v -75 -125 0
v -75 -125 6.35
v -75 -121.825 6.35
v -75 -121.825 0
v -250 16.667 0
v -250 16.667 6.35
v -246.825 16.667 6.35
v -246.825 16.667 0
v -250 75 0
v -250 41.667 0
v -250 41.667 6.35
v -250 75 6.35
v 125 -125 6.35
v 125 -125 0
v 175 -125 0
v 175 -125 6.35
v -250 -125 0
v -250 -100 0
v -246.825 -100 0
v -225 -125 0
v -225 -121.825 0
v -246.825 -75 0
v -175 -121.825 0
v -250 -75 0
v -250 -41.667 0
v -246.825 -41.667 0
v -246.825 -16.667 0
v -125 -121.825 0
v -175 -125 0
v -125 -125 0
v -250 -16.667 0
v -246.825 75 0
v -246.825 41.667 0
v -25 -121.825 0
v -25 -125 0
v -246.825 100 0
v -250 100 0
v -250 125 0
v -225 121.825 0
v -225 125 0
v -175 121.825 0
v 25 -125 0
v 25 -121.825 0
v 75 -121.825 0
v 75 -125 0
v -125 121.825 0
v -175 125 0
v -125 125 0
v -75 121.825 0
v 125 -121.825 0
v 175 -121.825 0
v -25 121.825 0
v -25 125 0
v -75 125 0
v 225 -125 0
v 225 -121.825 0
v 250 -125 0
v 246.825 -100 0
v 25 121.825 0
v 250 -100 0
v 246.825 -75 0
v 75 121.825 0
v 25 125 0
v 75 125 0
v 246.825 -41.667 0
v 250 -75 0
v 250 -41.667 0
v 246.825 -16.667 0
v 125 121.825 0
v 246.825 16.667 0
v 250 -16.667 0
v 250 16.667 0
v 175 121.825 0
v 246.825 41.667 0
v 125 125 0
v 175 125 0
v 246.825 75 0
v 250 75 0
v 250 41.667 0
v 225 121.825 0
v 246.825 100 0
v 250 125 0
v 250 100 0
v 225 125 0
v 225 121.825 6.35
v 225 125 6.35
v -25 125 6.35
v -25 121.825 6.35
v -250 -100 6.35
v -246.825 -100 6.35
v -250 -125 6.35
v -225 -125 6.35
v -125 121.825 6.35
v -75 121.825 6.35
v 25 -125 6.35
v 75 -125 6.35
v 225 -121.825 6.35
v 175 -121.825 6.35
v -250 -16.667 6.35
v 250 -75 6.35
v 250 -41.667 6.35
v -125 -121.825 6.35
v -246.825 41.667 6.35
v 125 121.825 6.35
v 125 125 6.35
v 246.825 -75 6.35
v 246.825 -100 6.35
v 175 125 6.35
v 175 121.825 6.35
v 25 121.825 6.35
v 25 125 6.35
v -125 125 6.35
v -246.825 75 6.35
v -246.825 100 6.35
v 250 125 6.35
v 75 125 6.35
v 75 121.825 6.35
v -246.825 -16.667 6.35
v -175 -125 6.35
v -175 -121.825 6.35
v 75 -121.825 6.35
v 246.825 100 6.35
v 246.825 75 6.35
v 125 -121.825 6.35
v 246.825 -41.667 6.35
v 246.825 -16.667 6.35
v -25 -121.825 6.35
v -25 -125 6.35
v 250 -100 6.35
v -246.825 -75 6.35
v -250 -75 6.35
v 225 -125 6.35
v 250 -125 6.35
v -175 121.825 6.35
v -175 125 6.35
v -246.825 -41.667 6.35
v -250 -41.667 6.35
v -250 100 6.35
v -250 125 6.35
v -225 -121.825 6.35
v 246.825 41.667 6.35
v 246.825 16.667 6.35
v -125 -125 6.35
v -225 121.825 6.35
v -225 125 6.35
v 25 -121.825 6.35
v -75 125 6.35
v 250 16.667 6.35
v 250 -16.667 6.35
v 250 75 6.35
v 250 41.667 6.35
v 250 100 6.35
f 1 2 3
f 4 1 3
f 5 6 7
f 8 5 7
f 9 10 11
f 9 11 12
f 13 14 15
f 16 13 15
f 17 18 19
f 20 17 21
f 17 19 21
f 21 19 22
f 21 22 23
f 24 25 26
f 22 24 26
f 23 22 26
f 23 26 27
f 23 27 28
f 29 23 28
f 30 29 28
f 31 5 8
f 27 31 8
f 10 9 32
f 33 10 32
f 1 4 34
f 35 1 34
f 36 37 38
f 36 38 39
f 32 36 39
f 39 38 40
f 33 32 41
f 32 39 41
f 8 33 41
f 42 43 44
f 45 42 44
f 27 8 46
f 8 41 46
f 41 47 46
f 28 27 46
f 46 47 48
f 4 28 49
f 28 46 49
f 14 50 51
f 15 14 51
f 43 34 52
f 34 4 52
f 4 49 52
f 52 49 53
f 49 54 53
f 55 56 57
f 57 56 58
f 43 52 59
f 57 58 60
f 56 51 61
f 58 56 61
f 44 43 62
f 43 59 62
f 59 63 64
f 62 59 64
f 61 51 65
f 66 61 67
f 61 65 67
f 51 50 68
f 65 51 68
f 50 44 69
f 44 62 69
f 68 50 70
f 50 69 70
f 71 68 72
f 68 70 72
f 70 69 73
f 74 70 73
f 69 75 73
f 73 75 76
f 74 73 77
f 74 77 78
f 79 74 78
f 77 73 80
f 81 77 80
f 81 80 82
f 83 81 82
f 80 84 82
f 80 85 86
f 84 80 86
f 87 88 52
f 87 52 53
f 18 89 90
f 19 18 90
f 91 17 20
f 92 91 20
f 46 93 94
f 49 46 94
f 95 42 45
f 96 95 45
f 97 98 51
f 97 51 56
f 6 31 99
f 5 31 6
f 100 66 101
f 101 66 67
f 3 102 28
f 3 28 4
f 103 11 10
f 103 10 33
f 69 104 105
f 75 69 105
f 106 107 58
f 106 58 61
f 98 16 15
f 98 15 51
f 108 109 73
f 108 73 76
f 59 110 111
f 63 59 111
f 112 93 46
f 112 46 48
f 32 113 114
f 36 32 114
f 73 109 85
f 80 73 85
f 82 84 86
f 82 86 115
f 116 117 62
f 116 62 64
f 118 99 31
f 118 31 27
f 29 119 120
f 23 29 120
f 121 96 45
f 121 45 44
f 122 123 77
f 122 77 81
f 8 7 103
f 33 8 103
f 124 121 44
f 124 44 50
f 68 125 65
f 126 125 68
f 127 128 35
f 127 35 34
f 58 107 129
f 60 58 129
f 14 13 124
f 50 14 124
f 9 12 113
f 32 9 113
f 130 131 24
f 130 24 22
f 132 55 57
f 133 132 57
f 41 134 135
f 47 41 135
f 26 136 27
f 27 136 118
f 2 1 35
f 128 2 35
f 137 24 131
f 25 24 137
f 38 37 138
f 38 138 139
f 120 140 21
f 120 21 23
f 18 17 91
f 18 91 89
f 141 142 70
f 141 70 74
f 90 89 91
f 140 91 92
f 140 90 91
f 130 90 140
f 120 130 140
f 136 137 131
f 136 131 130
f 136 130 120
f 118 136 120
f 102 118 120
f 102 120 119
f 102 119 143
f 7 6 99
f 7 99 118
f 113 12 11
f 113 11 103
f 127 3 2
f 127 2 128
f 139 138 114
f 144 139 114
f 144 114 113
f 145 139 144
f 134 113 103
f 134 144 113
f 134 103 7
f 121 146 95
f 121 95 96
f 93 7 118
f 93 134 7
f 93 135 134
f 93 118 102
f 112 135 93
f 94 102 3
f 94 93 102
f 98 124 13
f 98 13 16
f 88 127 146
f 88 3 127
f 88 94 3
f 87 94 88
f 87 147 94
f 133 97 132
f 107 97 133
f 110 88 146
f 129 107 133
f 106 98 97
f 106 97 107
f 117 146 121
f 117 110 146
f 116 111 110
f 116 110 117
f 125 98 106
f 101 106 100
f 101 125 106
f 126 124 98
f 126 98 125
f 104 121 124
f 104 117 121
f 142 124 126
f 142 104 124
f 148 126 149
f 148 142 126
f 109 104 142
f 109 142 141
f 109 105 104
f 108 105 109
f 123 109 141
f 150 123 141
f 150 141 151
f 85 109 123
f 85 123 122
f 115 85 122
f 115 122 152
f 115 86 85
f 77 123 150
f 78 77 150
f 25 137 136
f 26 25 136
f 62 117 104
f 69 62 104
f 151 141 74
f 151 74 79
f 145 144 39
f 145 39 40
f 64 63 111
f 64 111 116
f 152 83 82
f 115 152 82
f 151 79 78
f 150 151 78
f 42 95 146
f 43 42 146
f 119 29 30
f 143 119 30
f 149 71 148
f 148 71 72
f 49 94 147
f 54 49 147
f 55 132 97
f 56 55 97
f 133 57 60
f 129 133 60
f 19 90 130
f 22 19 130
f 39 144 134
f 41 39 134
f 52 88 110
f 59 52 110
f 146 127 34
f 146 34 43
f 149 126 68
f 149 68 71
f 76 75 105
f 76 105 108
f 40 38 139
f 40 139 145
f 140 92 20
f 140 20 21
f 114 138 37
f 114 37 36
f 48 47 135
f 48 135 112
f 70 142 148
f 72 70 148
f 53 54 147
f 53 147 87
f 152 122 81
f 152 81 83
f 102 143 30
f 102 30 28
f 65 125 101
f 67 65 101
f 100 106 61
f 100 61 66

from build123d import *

# Parameters (mm, degrees)
F0_W     = 500
F0_H     = 250
F1_DEPTH = 6.35
F2_W     = 50
F2_H     = 3.175
F2_W_2   = 3.175
F2_H_2   = 25
F3_DEPTH = 6.351


# Not quite as in the source:
# - a length typed as a fraction of an inch, garbled in the dataset ("3 / 203.2 mm" for 3/8 in), is restored


with BuildPart() as f1:
    # F0 (on Top) → F1 (new body)
    with BuildSketch(Plane.XY):
        Rectangle(F0_W, F0_H)
    extrude(amount=F1_DEPTH)

    # F2 (on face) → F3 (cut, through all)
    with BuildSketch(Plane.XY.offset(6.35)):
        with Locations((-200, 123.4125)):
            Rectangle(F2_W, F2_H)
        with Locations((-200, -123.4125)):
            Rectangle(F2_W, F2_H)
        with Locations((-100, 123.4125)):
            Rectangle(F2_W, F2_H)
        with Locations((-100, -123.4125)):
            Rectangle(F2_W, F2_H)
        with Locations((0, 123.4125)):
            Rectangle(F2_W, F2_H)
        with Locations((0, -123.4125)):
            Rectangle(F2_W, F2_H)
        with Locations((100, 123.4125)):
            Rectangle(F2_W, F2_H)
        with Locations((100, -123.4125)):
            Rectangle(F2_W, F2_H)
        with Locations((200, 123.4125)):
            Rectangle(F2_W, F2_H)
        with Locations((200, -123.4125)):
            Rectangle(F2_W, F2_H)
        with Locations((248.4125, 87.5)):
            Rectangle(F2_W_2, F2_H_2)
        with Locations((248.4125, 29.1666666667)):
            Rectangle(F2_W_2, F2_H_2)
        with Locations((248.4125, -29.1666666667)):
            Rectangle(F2_W_2, F2_H_2)
        with Locations((248.4125, -87.5)):
            Rectangle(F2_W_2, F2_H_2)
        with Locations((-248.4125, -87.5)):
            Rectangle(F2_W_2, F2_H_2)
        with Locations((-248.4125, 29.1666666667)):
            Rectangle(F2_W_2, F2_H_2)
        with Locations((-248.4125, -29.1666666667)):
            Rectangle(F2_W_2, F2_H_2)
        with Locations((-248.4125, 87.5)):
            Rectangle(F2_W_2, F2_H_2)
    extrude(amount=-F3_DEPTH, mode=Mode.SUBTRACT)


solid = f1.part
